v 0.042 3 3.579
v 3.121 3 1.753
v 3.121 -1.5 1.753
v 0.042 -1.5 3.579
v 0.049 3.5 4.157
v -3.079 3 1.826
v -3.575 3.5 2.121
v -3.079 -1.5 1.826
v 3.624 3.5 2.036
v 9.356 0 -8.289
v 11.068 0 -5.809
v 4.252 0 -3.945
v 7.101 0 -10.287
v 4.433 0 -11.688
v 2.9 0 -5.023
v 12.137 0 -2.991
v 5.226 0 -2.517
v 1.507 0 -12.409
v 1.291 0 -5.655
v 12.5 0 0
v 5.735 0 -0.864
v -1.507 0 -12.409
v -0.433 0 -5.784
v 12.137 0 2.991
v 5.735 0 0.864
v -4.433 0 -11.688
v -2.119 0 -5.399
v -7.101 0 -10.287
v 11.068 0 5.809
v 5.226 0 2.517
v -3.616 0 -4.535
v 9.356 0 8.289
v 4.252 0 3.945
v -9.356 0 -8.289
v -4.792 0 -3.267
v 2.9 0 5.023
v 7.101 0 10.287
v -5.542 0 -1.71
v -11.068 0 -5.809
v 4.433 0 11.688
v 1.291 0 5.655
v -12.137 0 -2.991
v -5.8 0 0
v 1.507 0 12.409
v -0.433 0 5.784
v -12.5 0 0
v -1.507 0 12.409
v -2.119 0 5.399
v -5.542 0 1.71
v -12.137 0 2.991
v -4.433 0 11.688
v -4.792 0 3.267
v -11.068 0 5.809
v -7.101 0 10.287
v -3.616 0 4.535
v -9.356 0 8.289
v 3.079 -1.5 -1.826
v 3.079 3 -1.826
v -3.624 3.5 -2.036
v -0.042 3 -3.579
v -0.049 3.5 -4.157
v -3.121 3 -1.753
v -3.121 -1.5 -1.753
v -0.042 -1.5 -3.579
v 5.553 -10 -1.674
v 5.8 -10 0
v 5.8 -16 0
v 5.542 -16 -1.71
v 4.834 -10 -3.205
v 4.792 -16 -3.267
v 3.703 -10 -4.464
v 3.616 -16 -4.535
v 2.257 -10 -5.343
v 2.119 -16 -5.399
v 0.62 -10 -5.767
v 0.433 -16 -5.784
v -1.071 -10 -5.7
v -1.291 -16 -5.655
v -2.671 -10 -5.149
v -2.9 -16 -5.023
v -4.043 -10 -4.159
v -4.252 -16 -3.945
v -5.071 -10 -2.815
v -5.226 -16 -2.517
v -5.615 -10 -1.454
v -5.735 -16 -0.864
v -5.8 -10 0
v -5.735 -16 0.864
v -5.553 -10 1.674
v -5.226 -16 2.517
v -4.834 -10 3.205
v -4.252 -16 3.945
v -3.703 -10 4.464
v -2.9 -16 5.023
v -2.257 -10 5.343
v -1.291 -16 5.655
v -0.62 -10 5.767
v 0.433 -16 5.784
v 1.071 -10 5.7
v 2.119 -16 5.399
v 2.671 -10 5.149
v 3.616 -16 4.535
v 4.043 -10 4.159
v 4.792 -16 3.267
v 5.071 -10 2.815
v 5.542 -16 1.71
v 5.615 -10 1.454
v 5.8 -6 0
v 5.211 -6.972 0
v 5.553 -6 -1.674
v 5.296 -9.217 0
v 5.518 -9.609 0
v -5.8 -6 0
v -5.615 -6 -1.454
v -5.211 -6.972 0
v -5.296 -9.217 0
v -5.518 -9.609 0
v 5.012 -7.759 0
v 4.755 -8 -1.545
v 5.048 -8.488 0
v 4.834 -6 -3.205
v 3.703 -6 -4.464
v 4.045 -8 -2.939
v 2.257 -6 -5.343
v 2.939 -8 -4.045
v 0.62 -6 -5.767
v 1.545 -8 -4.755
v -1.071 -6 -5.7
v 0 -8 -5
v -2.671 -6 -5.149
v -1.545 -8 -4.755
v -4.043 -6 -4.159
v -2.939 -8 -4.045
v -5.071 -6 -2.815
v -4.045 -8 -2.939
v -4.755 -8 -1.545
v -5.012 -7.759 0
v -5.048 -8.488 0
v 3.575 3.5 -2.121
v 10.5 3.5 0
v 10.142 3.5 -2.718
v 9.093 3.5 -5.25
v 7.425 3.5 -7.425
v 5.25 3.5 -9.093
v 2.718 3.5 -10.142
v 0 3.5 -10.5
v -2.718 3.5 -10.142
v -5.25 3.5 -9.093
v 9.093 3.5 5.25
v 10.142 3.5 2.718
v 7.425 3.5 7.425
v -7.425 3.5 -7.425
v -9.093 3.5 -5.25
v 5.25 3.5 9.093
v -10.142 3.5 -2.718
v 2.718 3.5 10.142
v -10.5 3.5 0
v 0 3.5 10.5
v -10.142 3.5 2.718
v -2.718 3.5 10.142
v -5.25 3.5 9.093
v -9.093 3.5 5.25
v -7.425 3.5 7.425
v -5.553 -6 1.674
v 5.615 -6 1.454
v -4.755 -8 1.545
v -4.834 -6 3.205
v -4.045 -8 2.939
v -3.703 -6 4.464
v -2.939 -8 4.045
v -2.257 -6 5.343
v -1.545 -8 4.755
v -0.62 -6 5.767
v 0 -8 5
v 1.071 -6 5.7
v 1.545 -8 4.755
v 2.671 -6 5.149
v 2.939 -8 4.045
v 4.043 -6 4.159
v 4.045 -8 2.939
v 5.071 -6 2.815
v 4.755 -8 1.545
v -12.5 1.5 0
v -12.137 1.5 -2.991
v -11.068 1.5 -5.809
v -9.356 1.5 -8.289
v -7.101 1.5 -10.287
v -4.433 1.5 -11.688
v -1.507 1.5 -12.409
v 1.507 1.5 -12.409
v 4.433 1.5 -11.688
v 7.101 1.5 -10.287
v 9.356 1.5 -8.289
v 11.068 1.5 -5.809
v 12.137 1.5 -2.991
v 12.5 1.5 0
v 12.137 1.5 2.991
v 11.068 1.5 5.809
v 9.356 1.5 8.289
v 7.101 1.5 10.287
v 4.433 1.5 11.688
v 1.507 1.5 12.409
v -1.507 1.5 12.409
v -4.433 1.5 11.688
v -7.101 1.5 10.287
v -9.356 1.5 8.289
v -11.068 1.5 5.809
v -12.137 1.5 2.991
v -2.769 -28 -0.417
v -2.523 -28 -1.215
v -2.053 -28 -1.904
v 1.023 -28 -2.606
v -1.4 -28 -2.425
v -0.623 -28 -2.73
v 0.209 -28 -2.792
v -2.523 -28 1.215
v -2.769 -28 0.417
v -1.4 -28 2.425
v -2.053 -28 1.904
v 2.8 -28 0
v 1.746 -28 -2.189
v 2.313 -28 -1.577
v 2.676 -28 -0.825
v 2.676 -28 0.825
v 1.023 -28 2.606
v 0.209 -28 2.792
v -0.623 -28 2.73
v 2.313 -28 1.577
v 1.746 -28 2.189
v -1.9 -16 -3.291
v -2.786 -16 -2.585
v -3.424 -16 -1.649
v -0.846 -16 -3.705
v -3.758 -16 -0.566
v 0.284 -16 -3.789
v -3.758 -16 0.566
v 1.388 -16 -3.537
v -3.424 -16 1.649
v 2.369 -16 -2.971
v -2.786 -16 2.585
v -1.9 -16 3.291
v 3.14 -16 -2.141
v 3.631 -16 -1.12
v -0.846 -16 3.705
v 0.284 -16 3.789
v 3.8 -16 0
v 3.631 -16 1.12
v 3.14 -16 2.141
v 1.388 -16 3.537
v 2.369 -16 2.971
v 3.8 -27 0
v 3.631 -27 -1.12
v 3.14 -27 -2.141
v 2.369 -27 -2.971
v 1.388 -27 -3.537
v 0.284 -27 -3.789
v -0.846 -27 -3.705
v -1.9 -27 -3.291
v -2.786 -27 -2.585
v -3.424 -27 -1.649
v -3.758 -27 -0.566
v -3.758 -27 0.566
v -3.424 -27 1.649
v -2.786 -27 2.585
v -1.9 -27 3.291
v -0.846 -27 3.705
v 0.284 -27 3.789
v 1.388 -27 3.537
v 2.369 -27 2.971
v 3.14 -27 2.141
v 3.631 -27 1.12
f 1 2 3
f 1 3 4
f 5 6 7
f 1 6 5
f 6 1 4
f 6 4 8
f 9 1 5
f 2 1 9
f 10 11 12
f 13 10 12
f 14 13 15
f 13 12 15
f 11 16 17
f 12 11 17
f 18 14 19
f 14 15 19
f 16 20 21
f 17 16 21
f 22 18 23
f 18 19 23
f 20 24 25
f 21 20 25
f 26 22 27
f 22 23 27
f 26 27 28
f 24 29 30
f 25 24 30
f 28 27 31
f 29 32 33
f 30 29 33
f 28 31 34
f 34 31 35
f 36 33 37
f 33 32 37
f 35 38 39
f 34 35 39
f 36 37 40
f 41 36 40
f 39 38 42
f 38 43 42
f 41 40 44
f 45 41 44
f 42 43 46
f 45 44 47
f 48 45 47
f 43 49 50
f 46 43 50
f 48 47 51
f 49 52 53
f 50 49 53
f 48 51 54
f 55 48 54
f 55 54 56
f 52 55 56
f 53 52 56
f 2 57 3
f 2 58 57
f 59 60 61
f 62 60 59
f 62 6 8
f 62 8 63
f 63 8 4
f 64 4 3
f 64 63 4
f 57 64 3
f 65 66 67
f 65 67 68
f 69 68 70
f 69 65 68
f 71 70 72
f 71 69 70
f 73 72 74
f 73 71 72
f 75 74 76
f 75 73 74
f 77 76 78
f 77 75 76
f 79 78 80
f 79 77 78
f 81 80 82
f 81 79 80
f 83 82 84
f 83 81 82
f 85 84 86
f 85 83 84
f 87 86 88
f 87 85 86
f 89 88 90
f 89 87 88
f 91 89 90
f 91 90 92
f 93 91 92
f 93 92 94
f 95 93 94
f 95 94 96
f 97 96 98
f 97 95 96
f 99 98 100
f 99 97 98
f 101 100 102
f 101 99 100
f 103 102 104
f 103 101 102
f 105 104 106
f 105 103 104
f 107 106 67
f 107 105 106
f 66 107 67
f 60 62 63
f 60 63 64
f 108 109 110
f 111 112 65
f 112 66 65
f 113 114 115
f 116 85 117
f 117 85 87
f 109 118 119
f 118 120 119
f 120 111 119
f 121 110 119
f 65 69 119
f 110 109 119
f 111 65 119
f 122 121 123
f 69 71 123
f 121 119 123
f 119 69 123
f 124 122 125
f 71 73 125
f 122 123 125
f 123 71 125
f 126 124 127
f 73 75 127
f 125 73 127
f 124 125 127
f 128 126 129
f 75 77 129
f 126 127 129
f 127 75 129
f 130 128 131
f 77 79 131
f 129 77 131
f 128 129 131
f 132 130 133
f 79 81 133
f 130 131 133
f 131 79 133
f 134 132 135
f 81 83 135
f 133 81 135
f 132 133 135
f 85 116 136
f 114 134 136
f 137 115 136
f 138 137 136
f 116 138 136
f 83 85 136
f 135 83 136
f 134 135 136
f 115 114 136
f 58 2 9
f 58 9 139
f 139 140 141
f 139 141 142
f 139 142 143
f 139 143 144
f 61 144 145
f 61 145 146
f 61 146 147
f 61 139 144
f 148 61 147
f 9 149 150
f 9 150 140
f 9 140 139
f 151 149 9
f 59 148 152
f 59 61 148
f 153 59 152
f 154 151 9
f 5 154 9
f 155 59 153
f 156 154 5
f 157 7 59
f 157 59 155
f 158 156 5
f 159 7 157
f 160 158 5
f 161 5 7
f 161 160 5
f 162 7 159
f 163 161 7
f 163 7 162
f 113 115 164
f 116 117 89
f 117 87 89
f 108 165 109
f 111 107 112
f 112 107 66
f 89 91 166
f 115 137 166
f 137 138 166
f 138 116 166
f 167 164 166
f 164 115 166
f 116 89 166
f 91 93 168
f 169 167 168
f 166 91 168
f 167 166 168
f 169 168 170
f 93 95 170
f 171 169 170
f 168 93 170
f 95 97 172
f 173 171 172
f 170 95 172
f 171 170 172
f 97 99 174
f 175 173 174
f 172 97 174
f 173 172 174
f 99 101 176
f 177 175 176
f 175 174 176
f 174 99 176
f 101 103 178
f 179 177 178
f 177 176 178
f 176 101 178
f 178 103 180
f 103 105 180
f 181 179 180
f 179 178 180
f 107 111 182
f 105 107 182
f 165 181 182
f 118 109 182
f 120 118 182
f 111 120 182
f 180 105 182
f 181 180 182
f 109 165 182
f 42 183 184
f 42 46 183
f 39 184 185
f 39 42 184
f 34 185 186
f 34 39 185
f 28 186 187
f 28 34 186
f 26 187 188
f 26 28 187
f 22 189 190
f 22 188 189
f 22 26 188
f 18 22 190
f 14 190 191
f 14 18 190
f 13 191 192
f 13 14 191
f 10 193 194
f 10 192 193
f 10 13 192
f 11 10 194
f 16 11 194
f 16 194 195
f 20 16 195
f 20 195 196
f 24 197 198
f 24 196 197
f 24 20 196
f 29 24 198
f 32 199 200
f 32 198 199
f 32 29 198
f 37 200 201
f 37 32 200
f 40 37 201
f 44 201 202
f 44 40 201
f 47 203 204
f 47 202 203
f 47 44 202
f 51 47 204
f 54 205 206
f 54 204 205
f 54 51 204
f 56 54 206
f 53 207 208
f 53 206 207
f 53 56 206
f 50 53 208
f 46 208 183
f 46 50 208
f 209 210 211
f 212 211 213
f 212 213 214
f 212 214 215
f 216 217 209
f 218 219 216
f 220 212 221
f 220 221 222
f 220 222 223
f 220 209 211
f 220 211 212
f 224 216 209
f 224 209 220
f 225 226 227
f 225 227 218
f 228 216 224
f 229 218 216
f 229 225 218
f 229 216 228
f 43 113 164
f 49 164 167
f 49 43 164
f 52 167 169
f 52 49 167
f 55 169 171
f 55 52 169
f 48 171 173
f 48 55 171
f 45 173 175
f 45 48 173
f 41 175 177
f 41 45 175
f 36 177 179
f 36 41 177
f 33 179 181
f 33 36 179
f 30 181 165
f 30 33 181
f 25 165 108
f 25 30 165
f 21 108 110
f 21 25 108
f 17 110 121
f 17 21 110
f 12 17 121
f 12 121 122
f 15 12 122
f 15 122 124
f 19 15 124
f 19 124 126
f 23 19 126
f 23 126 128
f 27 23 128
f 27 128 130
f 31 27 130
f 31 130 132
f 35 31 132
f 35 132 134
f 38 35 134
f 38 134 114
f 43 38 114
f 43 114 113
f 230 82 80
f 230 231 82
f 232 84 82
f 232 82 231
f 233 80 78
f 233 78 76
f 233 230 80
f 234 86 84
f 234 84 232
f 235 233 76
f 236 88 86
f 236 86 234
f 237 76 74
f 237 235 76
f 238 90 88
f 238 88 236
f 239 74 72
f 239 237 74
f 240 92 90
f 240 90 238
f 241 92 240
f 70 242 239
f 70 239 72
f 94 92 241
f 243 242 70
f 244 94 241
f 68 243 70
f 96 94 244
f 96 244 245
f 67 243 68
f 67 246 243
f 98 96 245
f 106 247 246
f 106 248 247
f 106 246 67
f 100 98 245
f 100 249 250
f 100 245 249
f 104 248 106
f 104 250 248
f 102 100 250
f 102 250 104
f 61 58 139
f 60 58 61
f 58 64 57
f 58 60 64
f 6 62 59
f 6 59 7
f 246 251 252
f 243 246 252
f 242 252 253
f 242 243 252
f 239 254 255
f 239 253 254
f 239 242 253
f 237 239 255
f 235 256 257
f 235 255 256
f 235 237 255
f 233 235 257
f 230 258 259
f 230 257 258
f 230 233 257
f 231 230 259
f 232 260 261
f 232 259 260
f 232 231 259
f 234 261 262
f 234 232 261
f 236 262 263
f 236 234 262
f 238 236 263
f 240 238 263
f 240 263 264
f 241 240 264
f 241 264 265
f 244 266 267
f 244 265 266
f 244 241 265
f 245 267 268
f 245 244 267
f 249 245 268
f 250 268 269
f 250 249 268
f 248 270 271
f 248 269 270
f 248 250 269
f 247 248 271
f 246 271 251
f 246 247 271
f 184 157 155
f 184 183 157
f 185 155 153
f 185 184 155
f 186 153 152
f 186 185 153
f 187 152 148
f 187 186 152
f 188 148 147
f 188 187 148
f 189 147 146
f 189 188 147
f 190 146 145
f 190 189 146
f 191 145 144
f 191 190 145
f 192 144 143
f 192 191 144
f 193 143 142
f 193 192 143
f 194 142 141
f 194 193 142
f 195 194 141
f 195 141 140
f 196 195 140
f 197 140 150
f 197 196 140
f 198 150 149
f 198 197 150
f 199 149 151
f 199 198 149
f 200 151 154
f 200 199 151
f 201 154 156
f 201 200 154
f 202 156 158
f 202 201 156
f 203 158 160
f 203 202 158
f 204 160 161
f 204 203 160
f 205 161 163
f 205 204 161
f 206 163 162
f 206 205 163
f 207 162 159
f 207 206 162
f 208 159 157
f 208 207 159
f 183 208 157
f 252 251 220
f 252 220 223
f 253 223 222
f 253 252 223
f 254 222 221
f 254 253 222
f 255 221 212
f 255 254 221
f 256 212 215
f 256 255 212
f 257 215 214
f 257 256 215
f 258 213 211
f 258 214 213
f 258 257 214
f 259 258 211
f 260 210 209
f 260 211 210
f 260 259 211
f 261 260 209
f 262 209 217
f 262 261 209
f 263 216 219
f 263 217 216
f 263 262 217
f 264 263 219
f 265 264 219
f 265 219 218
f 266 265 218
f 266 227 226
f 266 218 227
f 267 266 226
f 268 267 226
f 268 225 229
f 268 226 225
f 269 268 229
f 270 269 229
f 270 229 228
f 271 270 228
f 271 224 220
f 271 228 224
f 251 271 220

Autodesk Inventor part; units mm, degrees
sketch "草图1" plane through (0, 0, 0) normal (0, 1, 0) x (-1, 0, 0)
  circle A0 centre (0, 0) radius 12.5
  circle A1 centre (0, 0) radius 5.8
  dimension "d0" = 25
  dimension "d1" = 11.6
extrude "拉伸1" add sketch "草图1" along normal blind 3.5 contours A0 | A1
extrude "拉伸2" add sketch "草图1" against normal blind 6 contours A1
ref_plane "工作平面2" through (0, -8, 0) normal (0, -1, 0) x (1, 0, 0)
sketch "草图3" plane through (0, -8, 0) normal (0, -1, 0) x (1, 0, 0)
  circle A0 centre (0, 0) radius 5
  dimension "d10" = 10
ref_plane "工作平面1" through (0, -10, 0) normal (0, -1, 0) x (1, 0, 0)
sketch "草图2" plane through (0, -10, 0) normal (0, -1, 0) x (1, 0, 0)
  circle A0 centre (0, 0) radius 5.8 projected
extrude "拉伸3" add sketch "草图2" along normal blind 6
loft "放样1" add profiles "草图3" section 1 edges at (5.8, -6, 0) section 3 edges at (-5.8, -10, 0)
ref_plane "工作平面3" through (0, -16, 0) normal (0, -1, 0) x (1, 0, 0)
sketch "草图4" plane through (0, -16, 0) normal (0, -1, 0) x (1, 0, 0)
  circle A0 centre (0, 0) radius 3.8
  dimension "d18" = 7.6
extrude "拉伸4" add sketch "草图4" along normal blind 12
chamfer "倒角1" distance 1 angle 45 1 edges at (-3.8, -28, 0)
chamfer "倒角2" distance 2 angle 45 1 edges at (12.5, 3.5, 0)
sketch "草图5" plane through (0, 3.5, 0) normal (0, 1, 0) x (1, 0, 0)
  circle A0 centre (0, 0) radius 3.1
  line L0 (-3.0786, -1.8264) -> (-3.121, 1.7529)
  line L1 (-3.121, 1.7529) -> (-0.0425, 3.5793)
  line L2 (-0.0425, 3.5793) -> (3.0786, 1.8264)
  line L3 (3.0786, 1.8264) -> (3.121, -1.7529)
  line L4 (3.121, -1.7529) -> (0.0425, -3.5793)
  line L5 (0.0425, -3.5793) -> (-3.0786, -1.8264)
  dimension "d29" = 6.2
extrude "拉伸5" cut sketch "草图5" against normal blind 5
chamfer "倒角3" distance 0.5 angle 45 6 edges at (3.0998, 3.5, -0.0368) (1.5181, 3.5, -2.7029) (-1.5817, 3.5, -2.6661) (-3.0998, 3.5, 0.0368) (-1.5181, 3.5, 2.7029) (1.5817, 3.5, 2.6661)
thread "螺纹2" size "M8x1.25" class "6g" standard "ISO Metric profile" length 11
properties part number "Spindle_Screw"
